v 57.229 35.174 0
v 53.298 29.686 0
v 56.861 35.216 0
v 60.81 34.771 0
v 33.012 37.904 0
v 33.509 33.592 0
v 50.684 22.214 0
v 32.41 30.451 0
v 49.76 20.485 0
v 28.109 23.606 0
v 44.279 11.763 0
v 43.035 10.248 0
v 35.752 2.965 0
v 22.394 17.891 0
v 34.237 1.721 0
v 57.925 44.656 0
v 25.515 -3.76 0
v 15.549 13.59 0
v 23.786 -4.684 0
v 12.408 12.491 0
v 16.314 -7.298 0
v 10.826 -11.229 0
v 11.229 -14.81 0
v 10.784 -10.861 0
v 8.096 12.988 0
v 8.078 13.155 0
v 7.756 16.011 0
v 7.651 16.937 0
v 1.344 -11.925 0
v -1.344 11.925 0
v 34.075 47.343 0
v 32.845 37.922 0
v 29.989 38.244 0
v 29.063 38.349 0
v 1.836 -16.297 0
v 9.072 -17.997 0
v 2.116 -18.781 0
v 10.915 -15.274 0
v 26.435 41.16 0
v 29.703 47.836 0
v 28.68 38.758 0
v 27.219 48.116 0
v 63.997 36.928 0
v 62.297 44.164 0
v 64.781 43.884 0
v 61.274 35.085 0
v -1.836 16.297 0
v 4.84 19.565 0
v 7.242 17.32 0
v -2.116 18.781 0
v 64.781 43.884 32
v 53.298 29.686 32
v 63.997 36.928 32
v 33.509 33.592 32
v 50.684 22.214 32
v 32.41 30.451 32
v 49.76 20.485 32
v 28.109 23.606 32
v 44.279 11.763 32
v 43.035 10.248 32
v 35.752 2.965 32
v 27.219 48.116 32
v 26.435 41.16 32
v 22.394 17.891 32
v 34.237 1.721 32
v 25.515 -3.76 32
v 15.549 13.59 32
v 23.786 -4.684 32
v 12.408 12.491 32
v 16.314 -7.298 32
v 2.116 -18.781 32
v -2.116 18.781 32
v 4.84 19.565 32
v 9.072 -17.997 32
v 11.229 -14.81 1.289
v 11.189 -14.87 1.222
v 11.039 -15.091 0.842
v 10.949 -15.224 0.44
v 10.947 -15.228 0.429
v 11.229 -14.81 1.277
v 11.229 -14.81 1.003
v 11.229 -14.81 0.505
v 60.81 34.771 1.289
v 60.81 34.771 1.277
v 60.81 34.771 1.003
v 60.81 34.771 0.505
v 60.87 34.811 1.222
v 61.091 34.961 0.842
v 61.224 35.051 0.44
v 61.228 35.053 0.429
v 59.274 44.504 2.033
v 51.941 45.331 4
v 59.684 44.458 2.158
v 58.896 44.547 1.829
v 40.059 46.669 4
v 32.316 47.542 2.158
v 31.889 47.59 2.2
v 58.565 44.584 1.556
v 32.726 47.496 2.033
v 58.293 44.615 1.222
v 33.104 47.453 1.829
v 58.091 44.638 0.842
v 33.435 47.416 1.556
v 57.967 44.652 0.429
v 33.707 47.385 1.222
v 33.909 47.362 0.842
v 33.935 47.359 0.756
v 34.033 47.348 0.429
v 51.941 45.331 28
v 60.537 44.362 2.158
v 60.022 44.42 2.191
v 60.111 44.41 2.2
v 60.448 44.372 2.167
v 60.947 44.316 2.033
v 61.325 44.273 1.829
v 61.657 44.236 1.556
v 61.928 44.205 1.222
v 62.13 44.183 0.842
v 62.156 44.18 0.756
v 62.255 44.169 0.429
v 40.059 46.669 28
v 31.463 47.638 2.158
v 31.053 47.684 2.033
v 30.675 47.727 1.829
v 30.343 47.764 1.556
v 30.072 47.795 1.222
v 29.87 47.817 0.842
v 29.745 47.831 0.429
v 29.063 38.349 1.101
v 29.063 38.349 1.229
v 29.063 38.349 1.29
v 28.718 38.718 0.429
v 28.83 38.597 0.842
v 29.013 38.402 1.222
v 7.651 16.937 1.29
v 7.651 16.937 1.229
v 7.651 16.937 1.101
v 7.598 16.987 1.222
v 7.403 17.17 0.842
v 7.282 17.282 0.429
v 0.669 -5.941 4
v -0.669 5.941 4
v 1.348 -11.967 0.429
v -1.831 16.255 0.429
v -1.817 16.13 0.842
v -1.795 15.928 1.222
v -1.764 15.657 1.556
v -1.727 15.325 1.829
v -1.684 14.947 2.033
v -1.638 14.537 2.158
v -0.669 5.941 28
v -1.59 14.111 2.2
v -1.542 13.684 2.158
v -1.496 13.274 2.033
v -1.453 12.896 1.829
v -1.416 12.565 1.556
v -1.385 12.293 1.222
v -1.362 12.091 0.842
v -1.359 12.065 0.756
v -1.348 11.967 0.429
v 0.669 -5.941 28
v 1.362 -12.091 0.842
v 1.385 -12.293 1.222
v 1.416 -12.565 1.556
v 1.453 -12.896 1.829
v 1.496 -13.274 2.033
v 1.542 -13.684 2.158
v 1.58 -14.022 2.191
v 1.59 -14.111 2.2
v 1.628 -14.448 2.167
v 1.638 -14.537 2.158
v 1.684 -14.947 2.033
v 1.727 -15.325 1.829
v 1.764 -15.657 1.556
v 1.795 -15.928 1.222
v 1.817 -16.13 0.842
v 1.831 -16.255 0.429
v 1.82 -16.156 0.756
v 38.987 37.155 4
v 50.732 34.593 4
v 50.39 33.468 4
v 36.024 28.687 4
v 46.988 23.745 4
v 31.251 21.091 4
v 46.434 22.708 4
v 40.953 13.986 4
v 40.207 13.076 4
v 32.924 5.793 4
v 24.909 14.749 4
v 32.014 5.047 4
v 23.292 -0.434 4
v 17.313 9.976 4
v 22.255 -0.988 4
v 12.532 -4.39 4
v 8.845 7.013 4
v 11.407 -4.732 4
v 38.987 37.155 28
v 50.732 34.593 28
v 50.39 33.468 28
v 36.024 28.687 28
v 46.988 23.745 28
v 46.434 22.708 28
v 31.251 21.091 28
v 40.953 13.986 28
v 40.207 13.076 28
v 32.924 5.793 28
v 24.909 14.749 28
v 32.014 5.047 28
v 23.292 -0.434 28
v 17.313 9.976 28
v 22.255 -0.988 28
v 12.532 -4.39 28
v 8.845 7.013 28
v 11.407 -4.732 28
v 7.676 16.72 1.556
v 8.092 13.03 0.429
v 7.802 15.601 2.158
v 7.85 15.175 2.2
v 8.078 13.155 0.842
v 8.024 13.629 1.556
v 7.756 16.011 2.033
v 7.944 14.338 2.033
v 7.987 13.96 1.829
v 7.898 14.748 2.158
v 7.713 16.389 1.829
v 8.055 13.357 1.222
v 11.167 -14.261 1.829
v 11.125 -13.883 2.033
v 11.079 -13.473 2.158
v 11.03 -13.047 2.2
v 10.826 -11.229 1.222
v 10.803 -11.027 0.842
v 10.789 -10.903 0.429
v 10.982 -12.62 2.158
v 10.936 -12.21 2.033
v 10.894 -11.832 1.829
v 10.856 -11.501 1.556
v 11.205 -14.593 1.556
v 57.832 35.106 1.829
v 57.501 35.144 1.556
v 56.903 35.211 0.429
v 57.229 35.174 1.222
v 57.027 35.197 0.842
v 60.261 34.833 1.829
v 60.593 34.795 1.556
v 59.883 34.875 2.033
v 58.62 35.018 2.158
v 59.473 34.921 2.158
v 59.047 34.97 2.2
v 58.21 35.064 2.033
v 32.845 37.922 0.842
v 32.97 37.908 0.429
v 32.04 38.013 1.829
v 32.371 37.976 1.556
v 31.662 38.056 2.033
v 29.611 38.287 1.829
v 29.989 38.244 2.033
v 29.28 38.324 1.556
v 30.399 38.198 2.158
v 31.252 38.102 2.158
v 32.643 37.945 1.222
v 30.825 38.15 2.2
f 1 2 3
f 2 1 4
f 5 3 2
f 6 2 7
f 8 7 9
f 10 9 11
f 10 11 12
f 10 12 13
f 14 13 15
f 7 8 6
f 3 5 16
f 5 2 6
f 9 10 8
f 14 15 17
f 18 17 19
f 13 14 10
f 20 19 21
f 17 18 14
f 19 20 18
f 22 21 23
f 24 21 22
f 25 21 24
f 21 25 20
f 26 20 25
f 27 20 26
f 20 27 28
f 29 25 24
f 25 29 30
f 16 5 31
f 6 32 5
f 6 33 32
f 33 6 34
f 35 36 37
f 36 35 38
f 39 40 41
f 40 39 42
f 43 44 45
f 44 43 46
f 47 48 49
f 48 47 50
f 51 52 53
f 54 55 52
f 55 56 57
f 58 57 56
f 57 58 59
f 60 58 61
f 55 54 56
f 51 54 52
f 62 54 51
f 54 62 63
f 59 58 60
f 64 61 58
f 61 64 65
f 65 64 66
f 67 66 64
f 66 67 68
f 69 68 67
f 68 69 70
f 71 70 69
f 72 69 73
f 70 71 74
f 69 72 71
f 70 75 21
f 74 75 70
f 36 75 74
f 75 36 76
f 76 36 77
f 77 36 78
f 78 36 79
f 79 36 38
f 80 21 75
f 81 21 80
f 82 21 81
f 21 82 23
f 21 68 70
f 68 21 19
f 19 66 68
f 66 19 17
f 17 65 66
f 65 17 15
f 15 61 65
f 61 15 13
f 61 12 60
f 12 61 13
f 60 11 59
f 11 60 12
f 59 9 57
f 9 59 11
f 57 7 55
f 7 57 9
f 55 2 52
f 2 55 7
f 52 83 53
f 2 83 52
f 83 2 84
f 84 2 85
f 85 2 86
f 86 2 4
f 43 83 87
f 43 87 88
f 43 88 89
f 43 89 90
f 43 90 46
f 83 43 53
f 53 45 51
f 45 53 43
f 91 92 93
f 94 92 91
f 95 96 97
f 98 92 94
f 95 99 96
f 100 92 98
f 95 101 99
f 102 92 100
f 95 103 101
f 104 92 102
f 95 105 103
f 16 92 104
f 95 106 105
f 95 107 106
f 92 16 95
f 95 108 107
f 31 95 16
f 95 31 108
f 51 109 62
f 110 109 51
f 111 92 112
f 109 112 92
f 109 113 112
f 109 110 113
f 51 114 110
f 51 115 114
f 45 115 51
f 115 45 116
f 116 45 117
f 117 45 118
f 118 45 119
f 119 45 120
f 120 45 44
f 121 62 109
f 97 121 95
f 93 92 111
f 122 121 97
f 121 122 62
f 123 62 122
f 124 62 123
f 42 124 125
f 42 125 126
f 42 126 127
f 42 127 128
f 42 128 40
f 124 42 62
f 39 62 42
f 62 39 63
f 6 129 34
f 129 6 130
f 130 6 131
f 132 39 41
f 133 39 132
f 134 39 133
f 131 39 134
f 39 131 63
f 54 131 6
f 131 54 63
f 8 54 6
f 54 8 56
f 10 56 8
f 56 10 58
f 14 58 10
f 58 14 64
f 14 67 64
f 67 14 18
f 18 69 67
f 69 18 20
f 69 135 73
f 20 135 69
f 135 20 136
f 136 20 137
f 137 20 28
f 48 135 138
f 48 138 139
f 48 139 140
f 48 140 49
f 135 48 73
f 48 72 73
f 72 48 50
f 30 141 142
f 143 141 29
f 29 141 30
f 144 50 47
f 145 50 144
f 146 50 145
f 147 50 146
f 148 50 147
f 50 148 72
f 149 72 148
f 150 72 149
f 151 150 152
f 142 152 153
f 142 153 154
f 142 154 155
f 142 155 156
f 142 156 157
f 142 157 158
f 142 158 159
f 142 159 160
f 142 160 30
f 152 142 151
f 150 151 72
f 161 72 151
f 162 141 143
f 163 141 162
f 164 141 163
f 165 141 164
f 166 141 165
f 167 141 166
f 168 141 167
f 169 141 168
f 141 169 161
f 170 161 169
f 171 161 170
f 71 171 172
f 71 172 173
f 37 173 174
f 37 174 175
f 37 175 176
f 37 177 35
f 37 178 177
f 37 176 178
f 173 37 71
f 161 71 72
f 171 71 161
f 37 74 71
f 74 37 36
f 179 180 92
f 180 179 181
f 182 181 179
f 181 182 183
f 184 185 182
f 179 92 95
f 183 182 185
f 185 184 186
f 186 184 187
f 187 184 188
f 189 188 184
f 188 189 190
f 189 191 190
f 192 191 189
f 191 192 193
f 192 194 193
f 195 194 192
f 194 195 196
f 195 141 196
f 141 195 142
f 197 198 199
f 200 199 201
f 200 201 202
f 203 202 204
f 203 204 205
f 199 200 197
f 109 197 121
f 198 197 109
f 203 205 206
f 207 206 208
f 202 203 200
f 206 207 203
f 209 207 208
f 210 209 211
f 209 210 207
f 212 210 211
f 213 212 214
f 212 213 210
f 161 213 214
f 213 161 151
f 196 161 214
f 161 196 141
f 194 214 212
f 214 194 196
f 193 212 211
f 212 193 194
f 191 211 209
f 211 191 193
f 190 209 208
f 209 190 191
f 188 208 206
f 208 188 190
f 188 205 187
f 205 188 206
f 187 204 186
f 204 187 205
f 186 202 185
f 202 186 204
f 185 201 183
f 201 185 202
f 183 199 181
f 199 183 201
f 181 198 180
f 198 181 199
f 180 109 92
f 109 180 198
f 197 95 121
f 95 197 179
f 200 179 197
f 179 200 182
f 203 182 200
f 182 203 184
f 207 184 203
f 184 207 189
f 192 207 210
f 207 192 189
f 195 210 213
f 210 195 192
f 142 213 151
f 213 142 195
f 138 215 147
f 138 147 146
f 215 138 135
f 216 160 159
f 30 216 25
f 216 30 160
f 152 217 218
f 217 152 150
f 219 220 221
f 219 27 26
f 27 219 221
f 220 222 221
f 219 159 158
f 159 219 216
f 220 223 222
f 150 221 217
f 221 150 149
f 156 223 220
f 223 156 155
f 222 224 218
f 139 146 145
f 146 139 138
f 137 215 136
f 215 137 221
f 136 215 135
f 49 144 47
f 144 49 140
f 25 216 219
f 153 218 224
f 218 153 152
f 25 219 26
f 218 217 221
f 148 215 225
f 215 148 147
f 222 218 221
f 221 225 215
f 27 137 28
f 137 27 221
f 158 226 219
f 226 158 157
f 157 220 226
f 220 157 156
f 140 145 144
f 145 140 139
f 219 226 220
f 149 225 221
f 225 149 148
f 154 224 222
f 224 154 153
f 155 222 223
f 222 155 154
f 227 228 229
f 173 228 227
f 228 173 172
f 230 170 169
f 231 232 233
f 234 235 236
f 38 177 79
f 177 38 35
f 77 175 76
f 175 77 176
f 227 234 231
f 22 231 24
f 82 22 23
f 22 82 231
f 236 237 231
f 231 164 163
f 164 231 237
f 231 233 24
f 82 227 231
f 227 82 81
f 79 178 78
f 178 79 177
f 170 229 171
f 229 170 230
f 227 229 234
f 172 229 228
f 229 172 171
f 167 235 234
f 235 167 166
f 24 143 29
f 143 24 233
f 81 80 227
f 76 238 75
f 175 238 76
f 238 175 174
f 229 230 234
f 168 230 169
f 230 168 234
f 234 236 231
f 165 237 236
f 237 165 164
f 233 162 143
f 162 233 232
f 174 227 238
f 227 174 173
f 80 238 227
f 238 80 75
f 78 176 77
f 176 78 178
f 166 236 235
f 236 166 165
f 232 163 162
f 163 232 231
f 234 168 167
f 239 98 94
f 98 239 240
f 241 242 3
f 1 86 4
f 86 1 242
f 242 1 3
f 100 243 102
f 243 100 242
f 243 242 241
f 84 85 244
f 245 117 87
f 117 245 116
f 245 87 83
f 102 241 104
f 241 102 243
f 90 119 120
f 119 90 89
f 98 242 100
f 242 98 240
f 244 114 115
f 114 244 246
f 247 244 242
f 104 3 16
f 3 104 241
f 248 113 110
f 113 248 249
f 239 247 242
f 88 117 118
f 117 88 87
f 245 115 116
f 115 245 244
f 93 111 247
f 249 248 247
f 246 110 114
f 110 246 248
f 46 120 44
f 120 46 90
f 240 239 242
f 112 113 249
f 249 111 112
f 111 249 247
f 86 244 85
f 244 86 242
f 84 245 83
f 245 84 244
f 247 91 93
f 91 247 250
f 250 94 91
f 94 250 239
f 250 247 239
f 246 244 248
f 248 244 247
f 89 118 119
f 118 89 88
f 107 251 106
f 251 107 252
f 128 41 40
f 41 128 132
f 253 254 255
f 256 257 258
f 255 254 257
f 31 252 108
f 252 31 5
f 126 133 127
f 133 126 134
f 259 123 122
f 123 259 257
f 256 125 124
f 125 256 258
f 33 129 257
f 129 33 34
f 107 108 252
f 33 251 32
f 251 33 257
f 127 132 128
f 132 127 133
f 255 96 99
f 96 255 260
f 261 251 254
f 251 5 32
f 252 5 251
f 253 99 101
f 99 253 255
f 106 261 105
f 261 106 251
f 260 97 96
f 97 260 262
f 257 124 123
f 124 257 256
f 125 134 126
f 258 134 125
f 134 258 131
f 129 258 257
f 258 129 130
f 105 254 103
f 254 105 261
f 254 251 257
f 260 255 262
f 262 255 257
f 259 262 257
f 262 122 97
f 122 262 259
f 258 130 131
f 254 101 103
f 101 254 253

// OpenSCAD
$fn = 32;

// ----------------------------------------------------------------------
// Air duct: 20 mm duct, 4 mm wall, 32 mm across
// ----------------------------------------------------------------------

// --- parameters (mm) ---
duct_r = 10;              // duct core radius
duct_d = 20;              // duct core diameter
wall = 4;                 // duct wall thickness
height = 32;              // duct width (extrusion height)
port_r = 18.9;            // port flange half width
port_d = 37.8;            // port flange width
port_t = 7;               // port flange thickness
bolt_d = 4.4;             // port bolt holes
bolt_offset = 14.2;       // bolt hole offset from the port axis

difference() {
  /* outer hull chain: tube with a flat flange plate at every port */
  linear_extrude(height = 32) {
    hull() {
      polygon([[2.116, -18.781], [-2.116, 18.781], [4.84, 19.565], [9.072, -17.997]]);
      translate([9.937, 1.12]) circle(r = 10);
    }
    hull() {
      translate([9.937, 1.12]) circle(r = 10);
      translate([10.236, 1.153]) circle(r = 10);
    }
    hull() {
      translate([10.236, 1.153]) circle(r = 10);
      translate([19.959, 4.555]) circle(r = 10);
    }
    hull() {
      translate([19.959, 4.555]) circle(r = 10);
      translate([28.681, 10.036]) circle(r = 10);
    }
    hull() {
      translate([28.681, 10.036]) circle(r = 10);
      translate([35.964, 17.319]) circle(r = 10);
    }
    hull() {
      translate([35.964, 17.319]) circle(r = 10);
      translate([41.445, 26.041]) circle(r = 10);
    }
    hull() {
      translate([41.445, 26.041]) circle(r = 10);
      translate([44.847, 35.764]) circle(r = 10);
    }
    hull() {
      translate([44.847, 35.764]) circle(r = 10);
      translate([44.88, 36.063]) circle(r = 10);
    }
    hull() {
      translate([44.88, 36.063]) circle(r = 10);
      polygon([[27.219, 48.116], [64.781, 43.884], [63.997, 36.928], [26.435, 41.16]]);
    }
  }
  /* air passage: the same chain inset by the wall, 5 mm proud of the ports */
  translate([0, 0, 4]) linear_extrude(height = 24) {
    hull() {
      translate([-4.969, -0.56]) circle(r = 6);
      translate([10.236, 1.153]) circle(r = 6);
    }
    hull() {
      translate([10.236, 1.153]) circle(r = 6);
      translate([19.959, 4.555]) circle(r = 6);
    }
    hull() {
      translate([19.959, 4.555]) circle(r = 6);
      translate([28.681, 10.036]) circle(r = 6);
    }
    hull() {
      translate([28.681, 10.036]) circle(r = 6);
      translate([35.964, 17.319]) circle(r = 6);
    }
    hull() {
      translate([35.964, 17.319]) circle(r = 6);
      translate([41.445, 26.041]) circle(r = 6);
    }
    hull() {
      translate([41.445, 26.041]) circle(r = 6);
      translate([44.847, 35.764]) circle(r = 6);
    }
    hull() {
      translate([44.847, 35.764]) circle(r = 6);
      translate([46.56, 50.969]) circle(r = 6);
    }
  }
  translate([0, 0]) rotate([0, 0, -83.57]) translate([-14.2, -2.5]) rotate([-90, 0, 0]) cylinder(h = 12, d = 4.4);
  translate([0, 0]) rotate([0, 0, -83.57]) translate([14.2, -2.5]) rotate([-90, 0, 0]) cylinder(h = 12, d = 4.4);
  translate([46, 46]) rotate([0, 0, 173.57]) translate([-14.2, -2.5]) rotate([-90, 0, 0]) cylinder(h = 12, d = 4.4);
  translate([46, 46]) rotate([0, 0, 173.57]) translate([14.2, -2.5]) rotate([-90, 0, 0]) cylinder(h = 12, d = 4.4);
}
